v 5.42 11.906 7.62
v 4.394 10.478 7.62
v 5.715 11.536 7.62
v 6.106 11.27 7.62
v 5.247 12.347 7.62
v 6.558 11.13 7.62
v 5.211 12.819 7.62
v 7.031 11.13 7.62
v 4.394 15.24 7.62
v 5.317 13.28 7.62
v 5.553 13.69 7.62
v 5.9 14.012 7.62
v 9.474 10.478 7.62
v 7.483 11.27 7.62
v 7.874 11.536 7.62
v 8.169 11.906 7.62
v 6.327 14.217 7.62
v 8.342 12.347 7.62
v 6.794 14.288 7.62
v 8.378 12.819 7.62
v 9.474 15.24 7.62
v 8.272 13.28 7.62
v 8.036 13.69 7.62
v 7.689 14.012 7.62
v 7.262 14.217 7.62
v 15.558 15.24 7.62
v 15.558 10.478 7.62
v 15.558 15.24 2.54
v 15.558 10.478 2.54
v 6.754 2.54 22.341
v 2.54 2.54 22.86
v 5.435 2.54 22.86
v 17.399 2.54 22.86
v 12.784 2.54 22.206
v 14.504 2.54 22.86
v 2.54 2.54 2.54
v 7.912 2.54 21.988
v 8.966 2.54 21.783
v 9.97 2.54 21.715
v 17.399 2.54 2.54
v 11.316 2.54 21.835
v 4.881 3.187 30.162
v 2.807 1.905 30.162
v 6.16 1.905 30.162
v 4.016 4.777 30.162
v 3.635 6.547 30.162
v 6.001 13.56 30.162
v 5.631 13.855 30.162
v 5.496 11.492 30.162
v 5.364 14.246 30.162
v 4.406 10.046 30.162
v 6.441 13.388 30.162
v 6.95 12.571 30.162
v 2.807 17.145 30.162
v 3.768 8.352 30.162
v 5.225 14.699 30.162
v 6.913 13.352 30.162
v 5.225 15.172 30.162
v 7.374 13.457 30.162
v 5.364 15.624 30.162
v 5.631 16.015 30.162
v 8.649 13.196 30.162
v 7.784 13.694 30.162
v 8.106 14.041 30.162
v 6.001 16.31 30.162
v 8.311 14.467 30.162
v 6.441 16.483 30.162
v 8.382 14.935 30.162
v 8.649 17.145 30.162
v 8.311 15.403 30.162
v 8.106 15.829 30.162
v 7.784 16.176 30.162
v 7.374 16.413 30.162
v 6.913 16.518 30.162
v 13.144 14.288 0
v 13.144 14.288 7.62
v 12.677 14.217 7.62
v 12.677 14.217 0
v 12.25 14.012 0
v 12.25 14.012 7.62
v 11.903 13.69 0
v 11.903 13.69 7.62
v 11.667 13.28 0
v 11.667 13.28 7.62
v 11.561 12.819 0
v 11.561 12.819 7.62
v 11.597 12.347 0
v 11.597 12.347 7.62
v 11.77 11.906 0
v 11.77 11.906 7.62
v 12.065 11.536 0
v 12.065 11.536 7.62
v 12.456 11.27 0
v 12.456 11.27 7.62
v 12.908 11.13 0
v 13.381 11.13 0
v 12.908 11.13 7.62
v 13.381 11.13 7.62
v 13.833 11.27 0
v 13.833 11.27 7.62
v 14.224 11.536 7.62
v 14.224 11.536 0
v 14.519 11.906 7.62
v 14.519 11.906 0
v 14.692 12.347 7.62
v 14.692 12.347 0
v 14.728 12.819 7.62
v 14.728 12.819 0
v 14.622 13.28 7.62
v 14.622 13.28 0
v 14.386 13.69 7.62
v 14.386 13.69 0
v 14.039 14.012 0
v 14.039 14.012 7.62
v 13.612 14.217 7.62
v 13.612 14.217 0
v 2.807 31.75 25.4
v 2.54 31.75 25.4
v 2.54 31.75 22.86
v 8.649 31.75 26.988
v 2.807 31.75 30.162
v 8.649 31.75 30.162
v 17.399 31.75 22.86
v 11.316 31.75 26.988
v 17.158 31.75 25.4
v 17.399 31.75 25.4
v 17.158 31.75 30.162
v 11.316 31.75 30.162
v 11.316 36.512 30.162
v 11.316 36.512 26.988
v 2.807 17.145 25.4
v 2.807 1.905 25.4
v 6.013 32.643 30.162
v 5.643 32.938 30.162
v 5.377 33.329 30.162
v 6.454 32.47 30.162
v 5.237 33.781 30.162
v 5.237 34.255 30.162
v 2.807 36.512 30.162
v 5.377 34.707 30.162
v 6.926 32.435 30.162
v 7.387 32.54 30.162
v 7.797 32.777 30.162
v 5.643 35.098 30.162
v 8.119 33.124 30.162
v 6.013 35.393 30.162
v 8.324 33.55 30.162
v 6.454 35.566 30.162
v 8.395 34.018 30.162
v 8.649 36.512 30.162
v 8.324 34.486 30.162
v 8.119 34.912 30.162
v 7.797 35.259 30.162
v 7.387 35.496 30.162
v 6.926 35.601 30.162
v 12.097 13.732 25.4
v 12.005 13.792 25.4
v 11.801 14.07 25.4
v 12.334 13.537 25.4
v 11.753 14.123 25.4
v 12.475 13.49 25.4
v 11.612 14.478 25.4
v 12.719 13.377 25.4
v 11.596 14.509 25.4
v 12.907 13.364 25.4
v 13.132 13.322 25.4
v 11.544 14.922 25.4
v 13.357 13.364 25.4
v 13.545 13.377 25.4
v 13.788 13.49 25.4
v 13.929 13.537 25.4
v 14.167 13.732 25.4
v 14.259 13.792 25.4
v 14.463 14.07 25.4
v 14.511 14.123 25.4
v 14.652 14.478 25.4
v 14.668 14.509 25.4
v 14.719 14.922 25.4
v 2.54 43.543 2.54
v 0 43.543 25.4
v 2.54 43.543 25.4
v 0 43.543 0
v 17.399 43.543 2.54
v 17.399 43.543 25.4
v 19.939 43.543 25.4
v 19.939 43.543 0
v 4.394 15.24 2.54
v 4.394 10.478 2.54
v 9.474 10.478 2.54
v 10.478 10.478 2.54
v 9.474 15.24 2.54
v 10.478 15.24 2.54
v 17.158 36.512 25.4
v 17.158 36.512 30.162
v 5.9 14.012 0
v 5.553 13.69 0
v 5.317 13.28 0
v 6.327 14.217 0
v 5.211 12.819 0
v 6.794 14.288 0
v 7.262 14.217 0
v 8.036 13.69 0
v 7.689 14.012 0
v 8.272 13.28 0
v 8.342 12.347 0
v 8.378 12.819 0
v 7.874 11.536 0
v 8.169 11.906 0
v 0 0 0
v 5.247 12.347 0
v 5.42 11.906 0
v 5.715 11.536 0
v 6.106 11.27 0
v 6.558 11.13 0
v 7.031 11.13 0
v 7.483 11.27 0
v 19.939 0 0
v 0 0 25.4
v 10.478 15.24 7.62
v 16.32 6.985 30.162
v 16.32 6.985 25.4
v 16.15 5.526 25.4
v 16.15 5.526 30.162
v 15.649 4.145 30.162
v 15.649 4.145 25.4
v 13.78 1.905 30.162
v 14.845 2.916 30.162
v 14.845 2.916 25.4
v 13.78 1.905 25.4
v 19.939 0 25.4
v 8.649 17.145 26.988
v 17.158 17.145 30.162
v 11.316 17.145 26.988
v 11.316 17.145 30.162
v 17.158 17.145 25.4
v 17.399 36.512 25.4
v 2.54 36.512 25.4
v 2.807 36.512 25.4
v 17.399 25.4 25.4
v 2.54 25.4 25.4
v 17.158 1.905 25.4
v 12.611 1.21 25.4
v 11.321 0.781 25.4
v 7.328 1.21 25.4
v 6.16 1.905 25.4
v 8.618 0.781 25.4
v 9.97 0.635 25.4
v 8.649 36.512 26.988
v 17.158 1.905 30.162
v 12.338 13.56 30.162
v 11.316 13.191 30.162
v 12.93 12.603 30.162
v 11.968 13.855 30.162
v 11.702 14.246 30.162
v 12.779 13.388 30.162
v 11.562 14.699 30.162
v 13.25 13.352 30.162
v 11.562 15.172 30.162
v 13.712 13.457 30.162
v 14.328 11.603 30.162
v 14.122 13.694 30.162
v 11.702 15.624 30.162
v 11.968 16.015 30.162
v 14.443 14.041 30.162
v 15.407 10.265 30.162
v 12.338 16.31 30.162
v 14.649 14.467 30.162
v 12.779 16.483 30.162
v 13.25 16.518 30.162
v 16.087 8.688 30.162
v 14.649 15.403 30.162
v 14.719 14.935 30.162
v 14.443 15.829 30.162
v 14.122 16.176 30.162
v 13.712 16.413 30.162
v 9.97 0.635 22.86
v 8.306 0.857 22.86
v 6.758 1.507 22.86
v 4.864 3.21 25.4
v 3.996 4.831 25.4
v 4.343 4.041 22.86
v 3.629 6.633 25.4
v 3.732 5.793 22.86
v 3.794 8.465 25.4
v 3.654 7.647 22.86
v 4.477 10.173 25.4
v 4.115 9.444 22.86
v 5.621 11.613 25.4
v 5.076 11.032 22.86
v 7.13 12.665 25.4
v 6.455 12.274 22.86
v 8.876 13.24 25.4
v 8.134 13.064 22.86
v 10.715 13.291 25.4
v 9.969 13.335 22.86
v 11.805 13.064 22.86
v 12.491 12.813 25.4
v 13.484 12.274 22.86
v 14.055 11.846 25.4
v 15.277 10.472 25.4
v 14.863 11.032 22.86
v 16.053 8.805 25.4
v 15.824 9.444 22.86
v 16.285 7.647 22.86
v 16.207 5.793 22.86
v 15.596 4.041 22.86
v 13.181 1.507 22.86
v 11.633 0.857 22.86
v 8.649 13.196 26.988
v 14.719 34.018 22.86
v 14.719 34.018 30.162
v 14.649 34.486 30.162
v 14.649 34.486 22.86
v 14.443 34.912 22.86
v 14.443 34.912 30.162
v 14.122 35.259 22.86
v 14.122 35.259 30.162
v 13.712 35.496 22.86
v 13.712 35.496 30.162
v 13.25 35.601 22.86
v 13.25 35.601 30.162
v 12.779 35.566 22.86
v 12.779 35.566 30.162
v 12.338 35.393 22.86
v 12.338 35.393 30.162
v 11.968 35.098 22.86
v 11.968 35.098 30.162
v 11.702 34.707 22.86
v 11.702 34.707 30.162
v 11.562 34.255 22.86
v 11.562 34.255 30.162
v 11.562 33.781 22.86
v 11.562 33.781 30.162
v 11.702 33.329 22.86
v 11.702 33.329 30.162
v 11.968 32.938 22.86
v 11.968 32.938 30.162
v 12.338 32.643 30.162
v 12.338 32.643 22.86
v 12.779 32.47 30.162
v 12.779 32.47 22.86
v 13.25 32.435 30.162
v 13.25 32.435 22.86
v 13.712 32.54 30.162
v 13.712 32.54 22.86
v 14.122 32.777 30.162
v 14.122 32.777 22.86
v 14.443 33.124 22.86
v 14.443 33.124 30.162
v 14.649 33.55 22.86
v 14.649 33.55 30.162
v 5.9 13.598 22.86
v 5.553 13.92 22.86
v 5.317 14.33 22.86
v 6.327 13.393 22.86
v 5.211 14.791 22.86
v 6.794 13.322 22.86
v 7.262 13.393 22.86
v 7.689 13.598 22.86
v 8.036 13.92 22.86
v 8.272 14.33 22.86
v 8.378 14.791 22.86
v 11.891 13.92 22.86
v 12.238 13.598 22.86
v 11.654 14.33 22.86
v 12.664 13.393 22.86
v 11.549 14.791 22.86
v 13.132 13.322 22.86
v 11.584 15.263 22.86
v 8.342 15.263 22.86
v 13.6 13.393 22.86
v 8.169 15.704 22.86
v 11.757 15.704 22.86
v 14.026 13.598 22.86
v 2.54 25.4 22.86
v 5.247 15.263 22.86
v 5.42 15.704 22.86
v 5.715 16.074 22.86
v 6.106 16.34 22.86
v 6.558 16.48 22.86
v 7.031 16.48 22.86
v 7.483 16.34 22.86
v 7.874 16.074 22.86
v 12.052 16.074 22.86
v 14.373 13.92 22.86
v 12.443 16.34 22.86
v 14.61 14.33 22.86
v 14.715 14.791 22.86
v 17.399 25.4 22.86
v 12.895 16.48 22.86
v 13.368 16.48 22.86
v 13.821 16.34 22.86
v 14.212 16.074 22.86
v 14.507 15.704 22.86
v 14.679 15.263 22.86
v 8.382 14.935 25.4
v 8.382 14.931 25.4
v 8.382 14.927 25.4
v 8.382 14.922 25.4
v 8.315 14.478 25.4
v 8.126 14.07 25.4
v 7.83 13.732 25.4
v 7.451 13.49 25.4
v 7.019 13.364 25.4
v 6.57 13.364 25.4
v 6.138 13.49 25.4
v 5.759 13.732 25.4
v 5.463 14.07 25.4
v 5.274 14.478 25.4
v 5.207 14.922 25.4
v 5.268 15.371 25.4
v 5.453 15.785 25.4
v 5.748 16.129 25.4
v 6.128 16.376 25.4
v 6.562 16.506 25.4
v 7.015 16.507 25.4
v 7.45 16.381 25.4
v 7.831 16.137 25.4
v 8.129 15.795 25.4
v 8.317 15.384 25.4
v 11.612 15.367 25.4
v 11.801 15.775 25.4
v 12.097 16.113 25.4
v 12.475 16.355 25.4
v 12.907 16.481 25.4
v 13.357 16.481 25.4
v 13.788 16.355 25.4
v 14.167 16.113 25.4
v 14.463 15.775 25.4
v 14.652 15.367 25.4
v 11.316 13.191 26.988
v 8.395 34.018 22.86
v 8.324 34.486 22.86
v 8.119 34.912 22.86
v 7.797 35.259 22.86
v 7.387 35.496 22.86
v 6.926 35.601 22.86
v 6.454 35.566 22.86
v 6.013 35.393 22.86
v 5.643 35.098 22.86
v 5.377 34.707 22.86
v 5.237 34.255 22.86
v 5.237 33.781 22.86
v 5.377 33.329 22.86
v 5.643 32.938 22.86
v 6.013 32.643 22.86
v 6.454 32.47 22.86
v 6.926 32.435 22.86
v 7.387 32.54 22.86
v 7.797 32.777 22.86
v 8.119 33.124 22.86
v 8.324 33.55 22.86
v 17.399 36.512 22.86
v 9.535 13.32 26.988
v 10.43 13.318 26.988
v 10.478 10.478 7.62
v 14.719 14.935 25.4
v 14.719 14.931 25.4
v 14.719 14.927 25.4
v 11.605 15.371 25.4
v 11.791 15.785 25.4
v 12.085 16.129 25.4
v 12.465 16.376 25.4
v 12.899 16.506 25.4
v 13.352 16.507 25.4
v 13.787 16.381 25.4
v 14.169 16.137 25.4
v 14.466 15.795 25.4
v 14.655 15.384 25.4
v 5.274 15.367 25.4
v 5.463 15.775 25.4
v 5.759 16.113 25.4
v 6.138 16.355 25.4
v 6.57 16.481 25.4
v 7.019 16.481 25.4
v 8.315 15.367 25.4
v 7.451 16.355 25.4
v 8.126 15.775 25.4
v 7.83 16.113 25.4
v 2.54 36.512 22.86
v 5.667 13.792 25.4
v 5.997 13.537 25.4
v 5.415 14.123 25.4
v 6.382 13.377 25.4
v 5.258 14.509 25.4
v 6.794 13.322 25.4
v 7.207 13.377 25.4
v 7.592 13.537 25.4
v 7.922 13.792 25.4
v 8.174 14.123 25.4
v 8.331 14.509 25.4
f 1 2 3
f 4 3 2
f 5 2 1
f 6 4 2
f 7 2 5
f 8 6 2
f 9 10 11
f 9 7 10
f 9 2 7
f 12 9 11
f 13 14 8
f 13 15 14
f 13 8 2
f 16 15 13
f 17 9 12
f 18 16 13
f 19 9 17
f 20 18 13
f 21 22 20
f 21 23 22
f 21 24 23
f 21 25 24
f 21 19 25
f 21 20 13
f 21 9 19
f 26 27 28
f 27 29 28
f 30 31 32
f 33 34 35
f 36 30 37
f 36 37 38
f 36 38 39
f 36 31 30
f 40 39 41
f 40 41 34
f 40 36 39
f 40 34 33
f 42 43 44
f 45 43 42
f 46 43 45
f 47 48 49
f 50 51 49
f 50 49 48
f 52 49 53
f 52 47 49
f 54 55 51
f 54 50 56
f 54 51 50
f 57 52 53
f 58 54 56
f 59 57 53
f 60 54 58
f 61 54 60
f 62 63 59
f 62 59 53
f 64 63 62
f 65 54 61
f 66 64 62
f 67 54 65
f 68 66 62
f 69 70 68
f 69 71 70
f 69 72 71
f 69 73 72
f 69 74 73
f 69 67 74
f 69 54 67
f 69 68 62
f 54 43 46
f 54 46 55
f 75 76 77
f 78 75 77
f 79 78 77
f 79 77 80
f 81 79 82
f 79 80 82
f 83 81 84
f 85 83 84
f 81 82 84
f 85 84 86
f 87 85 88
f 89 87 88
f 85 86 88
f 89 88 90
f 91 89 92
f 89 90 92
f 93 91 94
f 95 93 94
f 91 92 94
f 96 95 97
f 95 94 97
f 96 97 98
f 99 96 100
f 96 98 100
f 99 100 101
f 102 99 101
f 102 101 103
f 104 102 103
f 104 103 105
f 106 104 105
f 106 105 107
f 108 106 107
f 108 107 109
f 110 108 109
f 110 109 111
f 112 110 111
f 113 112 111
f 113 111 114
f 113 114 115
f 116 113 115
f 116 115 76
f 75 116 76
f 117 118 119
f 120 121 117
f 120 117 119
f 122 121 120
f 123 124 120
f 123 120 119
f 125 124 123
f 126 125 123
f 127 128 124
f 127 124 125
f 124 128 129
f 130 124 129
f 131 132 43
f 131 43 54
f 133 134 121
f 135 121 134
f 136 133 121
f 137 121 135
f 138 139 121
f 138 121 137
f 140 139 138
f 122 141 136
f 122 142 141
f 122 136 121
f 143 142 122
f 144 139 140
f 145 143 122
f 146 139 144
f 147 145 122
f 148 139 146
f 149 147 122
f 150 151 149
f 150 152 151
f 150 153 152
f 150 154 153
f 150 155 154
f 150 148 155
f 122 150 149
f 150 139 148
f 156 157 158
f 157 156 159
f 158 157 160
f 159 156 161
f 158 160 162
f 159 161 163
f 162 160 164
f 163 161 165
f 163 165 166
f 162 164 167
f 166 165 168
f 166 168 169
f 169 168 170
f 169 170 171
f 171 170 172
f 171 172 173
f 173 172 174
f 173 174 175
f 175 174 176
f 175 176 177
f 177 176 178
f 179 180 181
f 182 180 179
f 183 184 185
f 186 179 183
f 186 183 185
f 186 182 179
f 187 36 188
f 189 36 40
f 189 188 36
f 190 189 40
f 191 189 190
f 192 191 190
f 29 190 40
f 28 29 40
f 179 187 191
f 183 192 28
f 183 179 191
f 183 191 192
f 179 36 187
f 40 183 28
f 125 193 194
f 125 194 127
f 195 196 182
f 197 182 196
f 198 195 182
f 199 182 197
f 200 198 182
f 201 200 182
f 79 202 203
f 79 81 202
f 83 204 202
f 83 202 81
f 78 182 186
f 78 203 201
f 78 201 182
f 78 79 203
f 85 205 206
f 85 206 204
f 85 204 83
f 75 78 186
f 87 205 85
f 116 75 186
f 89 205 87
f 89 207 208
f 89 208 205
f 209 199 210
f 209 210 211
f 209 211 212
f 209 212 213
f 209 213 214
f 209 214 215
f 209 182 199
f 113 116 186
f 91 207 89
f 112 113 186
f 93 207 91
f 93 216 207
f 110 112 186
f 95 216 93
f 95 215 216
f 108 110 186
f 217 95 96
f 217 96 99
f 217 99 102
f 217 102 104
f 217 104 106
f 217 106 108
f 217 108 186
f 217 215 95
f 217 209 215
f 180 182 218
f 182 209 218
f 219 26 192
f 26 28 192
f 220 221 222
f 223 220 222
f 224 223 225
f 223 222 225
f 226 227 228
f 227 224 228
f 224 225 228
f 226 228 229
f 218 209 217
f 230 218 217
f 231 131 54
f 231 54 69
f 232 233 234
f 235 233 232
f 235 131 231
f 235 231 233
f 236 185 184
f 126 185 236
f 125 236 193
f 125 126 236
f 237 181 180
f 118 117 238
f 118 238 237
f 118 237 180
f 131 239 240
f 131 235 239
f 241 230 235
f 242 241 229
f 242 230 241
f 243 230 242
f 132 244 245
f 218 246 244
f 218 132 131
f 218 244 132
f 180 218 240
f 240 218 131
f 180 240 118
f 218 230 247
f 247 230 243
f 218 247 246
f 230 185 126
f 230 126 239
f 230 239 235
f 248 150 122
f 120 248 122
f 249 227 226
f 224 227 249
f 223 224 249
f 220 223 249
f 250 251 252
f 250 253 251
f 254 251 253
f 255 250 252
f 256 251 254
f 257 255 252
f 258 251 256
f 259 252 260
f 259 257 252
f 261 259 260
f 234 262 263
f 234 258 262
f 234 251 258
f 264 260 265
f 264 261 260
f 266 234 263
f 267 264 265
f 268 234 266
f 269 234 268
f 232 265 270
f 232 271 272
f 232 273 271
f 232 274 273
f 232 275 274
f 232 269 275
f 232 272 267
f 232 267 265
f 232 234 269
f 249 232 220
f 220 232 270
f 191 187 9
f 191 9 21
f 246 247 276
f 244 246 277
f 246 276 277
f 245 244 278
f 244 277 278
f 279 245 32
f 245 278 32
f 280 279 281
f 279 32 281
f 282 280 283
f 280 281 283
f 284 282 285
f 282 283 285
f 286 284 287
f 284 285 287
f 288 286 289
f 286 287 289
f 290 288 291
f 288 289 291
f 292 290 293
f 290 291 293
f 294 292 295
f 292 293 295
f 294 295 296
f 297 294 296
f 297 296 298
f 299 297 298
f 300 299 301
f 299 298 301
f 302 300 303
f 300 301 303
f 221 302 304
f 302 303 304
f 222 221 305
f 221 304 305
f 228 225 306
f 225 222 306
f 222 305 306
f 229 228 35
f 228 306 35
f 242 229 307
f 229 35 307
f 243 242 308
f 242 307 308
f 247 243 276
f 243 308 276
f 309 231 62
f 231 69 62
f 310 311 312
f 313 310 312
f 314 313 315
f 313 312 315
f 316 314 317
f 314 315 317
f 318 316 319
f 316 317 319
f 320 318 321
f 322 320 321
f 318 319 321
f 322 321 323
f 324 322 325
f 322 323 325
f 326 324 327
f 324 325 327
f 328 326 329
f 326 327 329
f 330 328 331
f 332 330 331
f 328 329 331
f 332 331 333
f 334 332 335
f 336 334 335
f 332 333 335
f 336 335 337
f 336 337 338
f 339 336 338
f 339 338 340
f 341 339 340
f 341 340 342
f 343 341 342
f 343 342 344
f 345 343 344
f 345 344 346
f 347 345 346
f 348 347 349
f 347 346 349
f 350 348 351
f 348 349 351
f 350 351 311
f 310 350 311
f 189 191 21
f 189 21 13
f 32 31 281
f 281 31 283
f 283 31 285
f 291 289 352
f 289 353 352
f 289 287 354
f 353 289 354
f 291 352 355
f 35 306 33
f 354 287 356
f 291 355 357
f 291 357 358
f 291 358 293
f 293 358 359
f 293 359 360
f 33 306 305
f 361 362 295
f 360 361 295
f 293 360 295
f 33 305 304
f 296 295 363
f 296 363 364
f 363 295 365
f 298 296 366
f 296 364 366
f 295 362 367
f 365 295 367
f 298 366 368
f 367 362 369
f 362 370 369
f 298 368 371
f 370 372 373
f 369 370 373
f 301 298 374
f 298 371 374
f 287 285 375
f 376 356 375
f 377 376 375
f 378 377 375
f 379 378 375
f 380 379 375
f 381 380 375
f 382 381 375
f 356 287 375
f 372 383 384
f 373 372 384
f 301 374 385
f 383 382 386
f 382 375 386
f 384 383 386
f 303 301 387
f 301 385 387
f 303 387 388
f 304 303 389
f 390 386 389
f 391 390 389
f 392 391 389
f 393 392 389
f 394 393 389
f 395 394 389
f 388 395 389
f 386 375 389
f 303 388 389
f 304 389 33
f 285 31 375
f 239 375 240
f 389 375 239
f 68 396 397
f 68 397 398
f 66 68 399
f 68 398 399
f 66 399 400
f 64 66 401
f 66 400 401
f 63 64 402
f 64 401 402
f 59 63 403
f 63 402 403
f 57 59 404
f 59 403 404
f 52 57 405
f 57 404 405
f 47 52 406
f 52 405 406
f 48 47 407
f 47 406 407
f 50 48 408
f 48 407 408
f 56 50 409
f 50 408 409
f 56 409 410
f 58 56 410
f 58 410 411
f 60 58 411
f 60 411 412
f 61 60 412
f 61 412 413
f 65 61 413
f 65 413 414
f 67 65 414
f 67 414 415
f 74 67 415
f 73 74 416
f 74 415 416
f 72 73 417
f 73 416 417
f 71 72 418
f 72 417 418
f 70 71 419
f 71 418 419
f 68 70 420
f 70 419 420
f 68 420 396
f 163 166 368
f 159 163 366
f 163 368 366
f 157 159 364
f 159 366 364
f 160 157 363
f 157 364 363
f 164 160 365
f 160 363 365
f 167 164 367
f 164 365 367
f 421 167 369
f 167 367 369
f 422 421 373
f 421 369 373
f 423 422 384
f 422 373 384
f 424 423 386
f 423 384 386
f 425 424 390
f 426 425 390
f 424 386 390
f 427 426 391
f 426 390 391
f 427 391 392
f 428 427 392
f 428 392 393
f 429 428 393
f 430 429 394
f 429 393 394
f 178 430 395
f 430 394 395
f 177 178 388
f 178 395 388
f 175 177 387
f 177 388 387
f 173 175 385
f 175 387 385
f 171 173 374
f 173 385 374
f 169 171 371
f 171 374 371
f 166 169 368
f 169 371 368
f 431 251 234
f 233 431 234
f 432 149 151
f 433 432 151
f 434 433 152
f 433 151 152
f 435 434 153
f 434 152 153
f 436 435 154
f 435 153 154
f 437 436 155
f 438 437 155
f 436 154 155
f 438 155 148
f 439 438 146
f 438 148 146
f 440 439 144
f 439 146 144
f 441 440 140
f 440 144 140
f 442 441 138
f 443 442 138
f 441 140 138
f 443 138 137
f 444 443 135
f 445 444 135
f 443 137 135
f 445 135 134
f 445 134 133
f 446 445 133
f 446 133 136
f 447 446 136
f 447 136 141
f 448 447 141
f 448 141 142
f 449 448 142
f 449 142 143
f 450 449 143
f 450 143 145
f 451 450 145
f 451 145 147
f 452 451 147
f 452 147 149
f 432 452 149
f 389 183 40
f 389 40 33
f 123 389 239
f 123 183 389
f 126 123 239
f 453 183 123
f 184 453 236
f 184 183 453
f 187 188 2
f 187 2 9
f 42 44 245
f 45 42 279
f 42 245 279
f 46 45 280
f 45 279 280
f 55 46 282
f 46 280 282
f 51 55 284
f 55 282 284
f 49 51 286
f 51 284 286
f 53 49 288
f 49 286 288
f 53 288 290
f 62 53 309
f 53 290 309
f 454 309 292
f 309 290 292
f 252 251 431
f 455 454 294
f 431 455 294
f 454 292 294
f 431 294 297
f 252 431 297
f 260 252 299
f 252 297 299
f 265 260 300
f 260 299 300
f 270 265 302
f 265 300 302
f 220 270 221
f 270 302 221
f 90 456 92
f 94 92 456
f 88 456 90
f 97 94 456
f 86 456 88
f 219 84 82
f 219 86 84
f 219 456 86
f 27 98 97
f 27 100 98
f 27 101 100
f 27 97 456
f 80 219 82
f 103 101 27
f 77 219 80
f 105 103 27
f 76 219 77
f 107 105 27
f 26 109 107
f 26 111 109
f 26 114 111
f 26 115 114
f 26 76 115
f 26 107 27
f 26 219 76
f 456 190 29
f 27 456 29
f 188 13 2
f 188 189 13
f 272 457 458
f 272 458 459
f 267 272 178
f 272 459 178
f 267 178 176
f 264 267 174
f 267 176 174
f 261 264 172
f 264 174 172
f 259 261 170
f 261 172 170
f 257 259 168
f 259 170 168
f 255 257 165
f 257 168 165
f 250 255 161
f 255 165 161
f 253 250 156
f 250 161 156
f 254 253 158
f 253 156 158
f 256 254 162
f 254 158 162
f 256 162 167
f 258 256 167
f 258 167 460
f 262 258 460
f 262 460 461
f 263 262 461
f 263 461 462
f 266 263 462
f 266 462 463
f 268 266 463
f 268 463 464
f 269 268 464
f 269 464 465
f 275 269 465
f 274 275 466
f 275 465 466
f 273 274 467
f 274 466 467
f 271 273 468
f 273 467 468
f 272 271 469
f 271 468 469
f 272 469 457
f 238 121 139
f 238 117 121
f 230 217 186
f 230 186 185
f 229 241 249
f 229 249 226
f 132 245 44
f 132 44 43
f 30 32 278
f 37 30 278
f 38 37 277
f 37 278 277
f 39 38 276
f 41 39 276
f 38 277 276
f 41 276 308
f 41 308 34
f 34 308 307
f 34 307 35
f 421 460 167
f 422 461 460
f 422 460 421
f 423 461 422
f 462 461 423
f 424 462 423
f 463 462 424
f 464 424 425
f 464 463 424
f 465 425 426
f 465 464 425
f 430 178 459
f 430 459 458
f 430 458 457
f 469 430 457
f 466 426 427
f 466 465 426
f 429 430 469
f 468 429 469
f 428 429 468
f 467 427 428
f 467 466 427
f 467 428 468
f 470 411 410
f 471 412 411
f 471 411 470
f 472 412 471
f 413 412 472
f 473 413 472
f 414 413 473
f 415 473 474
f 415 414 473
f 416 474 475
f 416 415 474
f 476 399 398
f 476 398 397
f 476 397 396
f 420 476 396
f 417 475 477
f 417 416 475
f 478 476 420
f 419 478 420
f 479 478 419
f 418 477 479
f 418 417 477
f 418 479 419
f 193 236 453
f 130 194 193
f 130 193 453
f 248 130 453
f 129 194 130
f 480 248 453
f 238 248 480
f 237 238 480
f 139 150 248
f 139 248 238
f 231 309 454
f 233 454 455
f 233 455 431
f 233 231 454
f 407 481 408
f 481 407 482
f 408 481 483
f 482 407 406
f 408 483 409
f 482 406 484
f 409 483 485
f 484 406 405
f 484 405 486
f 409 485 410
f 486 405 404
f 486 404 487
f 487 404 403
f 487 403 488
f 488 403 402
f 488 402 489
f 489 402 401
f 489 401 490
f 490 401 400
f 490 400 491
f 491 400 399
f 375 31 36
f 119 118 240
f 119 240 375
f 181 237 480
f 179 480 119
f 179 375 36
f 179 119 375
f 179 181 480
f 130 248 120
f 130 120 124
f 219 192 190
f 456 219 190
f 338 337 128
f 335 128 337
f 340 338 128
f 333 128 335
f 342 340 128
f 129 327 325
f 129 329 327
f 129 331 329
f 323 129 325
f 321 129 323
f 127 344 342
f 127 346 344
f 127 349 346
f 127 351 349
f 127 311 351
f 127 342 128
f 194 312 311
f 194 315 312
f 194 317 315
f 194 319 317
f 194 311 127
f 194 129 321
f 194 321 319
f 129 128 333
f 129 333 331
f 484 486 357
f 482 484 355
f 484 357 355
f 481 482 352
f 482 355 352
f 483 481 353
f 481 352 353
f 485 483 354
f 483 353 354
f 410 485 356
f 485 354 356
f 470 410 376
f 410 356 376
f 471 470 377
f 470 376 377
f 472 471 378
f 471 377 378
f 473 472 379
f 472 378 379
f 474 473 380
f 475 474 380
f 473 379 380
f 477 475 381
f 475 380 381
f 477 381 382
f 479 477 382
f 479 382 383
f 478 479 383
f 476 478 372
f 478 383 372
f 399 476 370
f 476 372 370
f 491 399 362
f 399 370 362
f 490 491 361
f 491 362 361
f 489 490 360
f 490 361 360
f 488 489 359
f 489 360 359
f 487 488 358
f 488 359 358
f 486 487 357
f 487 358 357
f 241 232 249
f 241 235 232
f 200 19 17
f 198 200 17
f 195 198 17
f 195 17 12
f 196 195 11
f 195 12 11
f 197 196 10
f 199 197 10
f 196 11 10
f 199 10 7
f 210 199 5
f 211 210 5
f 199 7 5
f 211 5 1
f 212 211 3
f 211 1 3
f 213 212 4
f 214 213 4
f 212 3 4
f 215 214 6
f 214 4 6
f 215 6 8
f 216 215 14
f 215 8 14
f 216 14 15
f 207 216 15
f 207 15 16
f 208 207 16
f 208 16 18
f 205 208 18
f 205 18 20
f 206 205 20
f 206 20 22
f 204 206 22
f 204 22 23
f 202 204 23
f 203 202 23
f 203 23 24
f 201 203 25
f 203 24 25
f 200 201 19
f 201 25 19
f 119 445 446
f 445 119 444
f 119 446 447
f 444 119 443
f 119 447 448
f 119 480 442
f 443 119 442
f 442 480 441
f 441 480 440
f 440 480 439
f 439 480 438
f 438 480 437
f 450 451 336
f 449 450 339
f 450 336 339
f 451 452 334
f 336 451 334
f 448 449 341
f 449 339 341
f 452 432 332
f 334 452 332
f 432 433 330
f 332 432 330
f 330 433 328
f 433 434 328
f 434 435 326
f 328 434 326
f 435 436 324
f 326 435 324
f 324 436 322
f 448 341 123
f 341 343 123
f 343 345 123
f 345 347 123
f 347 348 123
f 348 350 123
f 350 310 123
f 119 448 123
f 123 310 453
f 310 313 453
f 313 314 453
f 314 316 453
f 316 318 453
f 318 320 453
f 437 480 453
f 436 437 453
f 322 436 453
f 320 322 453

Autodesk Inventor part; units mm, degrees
ref_plane "YZ Plane" through (0, 0, 0) normal (1, 0, 0) x (0, 1, 0)
ref_plane "XZ Plane" through (0, 0, 0) normal (0, 1, 0) x (-1, 0, 0)
ref_plane "XY Plane" through (0, 0, 0) normal (0, 0, 1) x (1, 0, 0)
sketch "Sketch1" plane through (0, 0, 0) normal (0, 0, 1) x (1, 0, 0)
  line L0 (0, 0) -> (19.939, 0)
  line L1 (19.939, 0) -> (19.939, 25.4)
  line L2 (19.939, 25.4) -> (0, 25.4)
  line L3 (0, 25.4) -> (0, 0)
  dimension "d0" = 19.939
  dimension "d1" = 25.4
extrude "Extrusion1" add sketch "Sketch1" along normal blind 25.4
shell "Shell1" thickness 2.54 removed faces 1 at (13.2927, 25.4, 8.4667)
sketch "Sketch2" plane through (0, 0, 25.4) normal (0, 0, 1) x (1, 0, 0)
  line L0 (15.367, 1.905) -> (4.572, 1.905)
  line L1 (4.572, 1.905) -> (4.572, 17.145)
  line L2 (4.572, 17.145) -> (15.367, 17.145)
  line L3 (15.367, 17.145) -> (15.367, 1.905)
  line L4 (15.367, 1.905) -> (4.572, 17.145) construction
  line L5 (4.572, 1.905) -> (15.367, 17.145) construction
  line L6 (0, 25.4) -> (0, 0) projected
  line L7 (0, 0) -> (19.939, 0) projected
  circle A0 centre (9.9695, 6.985) radius 3.175
  circle A1 centre (6.7945, 14.9098) radius 1.5875
  circle A2 centre (13.1318, 14.9098) radius 1.5875
  line L8 (19.939, 0) -> (19.939, 25.4) projected
  point P0 (9.9695, 9.525)
  dimension "d5" = 9.9695
  dimension "d6" = 9.525
  dimension "d7" = 15.24
  dimension "d8" = 10.795
  dimension "d9" = 6.35
  dimension "d10" = 5.08
  dimension "d11" = 3.175
  dimension "d12" = 7.9248
  dimension "d13" = 3.175
  dimension "d15" = 6.7945
  dimension "d16" = 6.8072
  dimension "d24" = 6.985
hole "Hole1" at (13.1318, 14.9098, 25.4) at (6.7945, 14.9098, 25.4) direction (0, 0, -1) diameter 3.175 depth 7.62 tip angle 118
sketch "Sketch3" plane through (0, 0, 25.4) normal (0, 0, 1) x (1, 0, 0)
  circle A0 centre (9.9695, 6.985) radius 6.35
  line L0 (0, 0) -> (19.939, 0) projected
  line L1 (19.939, 0) -> (19.939, 25.4) projected
  dimension "d25" = 12.7
  dimension "d26" = 6.985
  dimension "d27" = 9.9695
hole "Hole2" at (9.9695, 6.985, 25.4) direction (0, 0, -1) diameter 12.7 depth 2.54 tip angle 118
sketch "Sketch4" plane through (0, 0, 25.4) normal (0, 0, 1) x (1, 0, 0)
  line L0 (17.1577, 1.905) -> (2.8067, 1.905)
  line L1 (2.8067, 1.905) -> (2.8067, 17.145)
  line L2 (2.8067, 17.145) -> (17.1577, 17.145)
  line L3 (17.1577, 17.145) -> (17.1577, 1.905)
  line L4 (17.1577, 1.905) -> (2.8067, 17.145) construction
  line L5 (2.8067, 1.905) -> (17.1577, 17.145) construction
  line L6 (0, 0) -> (19.939, 0) projected
  line L7 (0, 25.4) -> (0, 0) projected
  circle A0 centre (13.1318, 14.9352) radius 1.5875
  circle A1 centre (6.7945, 14.9352) radius 1.5875
  line L8 (19.939, 0) -> (19.939, 25.4) projected
  circle A2 centre (9.9695, 6.985) radius 6.35
  point P0 (9.9822, 9.525)
  dimension "d35" = 9.525
  dimension "d36" = 14.351
  dimension "d38" = 9.9822
  dimension "d39" = 6.8072
  dimension "d40" = 6.7945
  dimension "d41" = 12.7
  dimension "d42" = 9.9695
  dimension "d43" = 5.08
  dimension "d44" = 7.9502
  dimension "d45" = 7.9502
  dimension "d56" = 6.3373
  dimension "d66" = 1.905
  dimension "d75" = 2.8067
  dimension "d76" = 2.7813
sketch "Sketch5" plane through (0, 0, 25.4) normal (0, 0, 1) x (1, 0, 0)
  point P0 (0, 0)
extrude "Extrusion2" add sketch "Sketch4" along normal blind 4.7625 contours L0 A2 L1 L2 L3
sketch "Sketch6" plane through (0, 0, 30.1625) normal (0, 0, 1) x (1, 0, 0)
  line L0 (17.1577, 1.905) -> (2.8067, 1.905) projected
  line L1 (8.6487, 1.905) -> (11.3157, 1.905)
  line L2 (11.3157, 1.905) -> (11.3157, 40.005)
  line L3 (11.3157, 40.005) -> (8.6487, 40.005)
  line L4 (8.6487, 40.005) -> (8.6487, 1.905)
  line L5 (17.1577, 1.905) -> (17.1577, 17.145) projected
  point P0 (0, 0)
  dimension "d48" = 2.667
  dimension "d49" = 5.842
  dimension "d71" = 38.1
extrude "Extrusion3" cut sketch "Sketch6" against normal blind 3.175
sketch "Sketch9" plane through (2.54, 2.54, 2.54) normal (0, 0, 1) x (1, 0, 0)
  line L0 (1.8542, 12.7) -> (6.9342, 12.7)
  line L1 (6.9342, 12.7) -> (6.9342, 7.9375)
  line L2 (6.9342, 7.9375) -> (1.8542, 7.9375)
  line L3 (1.8542, 7.9375) -> (1.8542, 12.7)
  line L4 (7.9375, 12.7) -> (14.2875, 12.7)
  line L5 (14.2875, 12.7) -> (14.2875, 7.9375)
  line L6 (14.2875, 7.9375) -> (7.9375, 7.9375)
  line L7 (7.9375, 7.9375) -> (7.9375, 12.7)
  line L8 (0, 22.86) -> (14.859, 22.86) projected
  line L9 (0, 22.86) -> (0, 0) projected
  point P0 (-2.54, -2.54)
  dimension "d97" = 10.16
  dimension "d98" = 5.08
  dimension "d100" = 1.8542
  dimension "d101" = 4.7625
extrude "Extrusion5" add sketch "Sketch9" along normal blind 5.08 contours L0 L1 L2 L3
sketch "Sketch10" plane through (2.54, 2.54, 2.54) normal (0, 0, 1) x (1, 0, 0)
  line L0 (7.9375, 7.9375) -> (13.0175, 7.9375)
  line L1 (13.0175, 7.9375) -> (13.0175, 12.7)
  line L2 (13.0175, 12.7) -> (7.9375, 12.7)
  line L3 (7.9375, 12.7) -> (7.9375, 7.9375)
  line L4 (0, 22.86) -> (14.859, 22.86) projected
  line L5 (1.8542, 12.7) -> (6.9342, 12.7) projected
  point P0 (-2.54, -2.54)
  dimension "d94" = 5.08
  dimension "d95" = 10.16
  dimension "d96" = 10.16
  dimension "d99" = 1.8415
  dimension "d102" = 4.7625
extrude "Extrusion6" add sketch "Sketch10" along normal blind 5.08
sketch "Sketch11" plane through (0, 0, 0) normal (0, 0, -1) x (-1, 0, 0)
  circle A0 centre (-13.1445, 12.7) radius 1.5875
  circle A1 centre (-6.7945, 12.7) radius 1.5875
  line L0 (0, 25.4) -> (0, 0) projected
  line L1 (-19.939, 0) -> (-19.939, 25.4) projected
  line L2 (0, 0) -> (-19.939, 0) projected
  dimension "d81" = 6.7945
  dimension "d91" = 12.7
  dimension "d92" = 12.7
  dimension "d93" = 6.35
hole "Hole4" at (13.1445, 12.7, 0) at (6.7945, 12.7, 0) direction (0, 0, 1) diameter 3.175 depth 15.24 tip angle 118
sketch "Sketch12" plane through (0, 25.4, 0) normal (0, 1, 0) x (1, 0, 0)
  line L0 (0, 0) -> (0, -25.4) projected
  line L1 (19.939, 0) -> (19.939, -25.4) projected
  line L2 (0, 0) -> (19.939, 0)
  line L3 (19.939, 0) -> (19.939, -25.4)
  line L4 (19.939, -25.4) -> (0, -25.4)
  line L5 (0, -25.4) -> (0, 0)
extrude "Extrusion7" add sketch "Sketch12" along normal blind 18.1429
sketch "Sketch13" plane through (0, 43.5429, 0) normal (0, 1, 0) x (1, 0, 0)
  line L0 (2.54, -2.54) -> (17.399, -2.54)
  line L1 (17.399, -2.54) -> (17.399, -25.4)
  line L2 (17.399, -25.4) -> (2.54, -25.4)
  line L3 (2.54, -25.4) -> (2.54, -2.54)
  line L4 (19.939, 0) -> (0, 0) projected
  line L5 (0, 0) -> (0, -25.4) projected
  line L6 (19.939, -25.4) -> (19.939, 0) projected
  dimension "d105" = 2.54
  dimension "d106" = 2.54
  dimension "d107" = 25.4
  dimension "d110" = 2.54
extrude "Extrusion8" cut sketch "Sketch13" against normal blind 18.1429
sketch "Sketch14" plane through (0, 0, 25.4) normal (0, 0, 1) x (1, 0, 0)
  line L0 (2.8067, 36.5125) -> (17.1577, 36.5125)
  line L1 (17.1577, 36.5125) -> (17.1577, 31.75)
  line L2 (17.1577, 31.75) -> (2.8067, 31.75)
  line L3 (2.8067, 31.75) -> (2.8067, 36.5125)
  line L4 (0, 0) -> (0, 43.5429) projected
  line L5 (19.939, 0) -> (19.939, 43.5429) projected
  line L6 (2.8067, 17.145) -> (2.8067, 1.905) projected
  line L7 (17.1577, 1.905) -> (17.1577, 17.145) projected
  dimension "d134" = 0
  dimension "d135" = 0
extrude "Extrusion9" add sketch "Sketch14" along normal blind 4.7625 and the other way blind 2.54
sketch "Sketch15" plane through (0, 0, 30.1625) normal (0, 0, 1) x (1, 0, 0)
  line L0 (2.8067, 31.75) -> (17.1577, 31.75) projected
  line L1 (8.6487, 31.75) -> (11.3157, 31.75)
  line L2 (11.3157, 31.75) -> (11.3157, 36.5125)
  line L3 (11.3157, 36.5125) -> (8.6487, 36.5125)
  line L4 (8.6487, 36.5125) -> (8.6487, 31.75)
  line L5 (2.8067, 36.5125) -> (2.8067, 31.75) projected
  line L6 (17.1577, 31.75) -> (17.1577, 36.5125) projected
  line L7 (17.1577, 36.5125) -> (2.8067, 36.5125) projected
  line L8 (19.939, 0) -> (19.939, 43.5429) projected
  line L9 (17.399, 43.5429) -> (17.399, 25.4) projected
  line L10 (17.1577, 1.905) -> (17.1577, 17.145) projected
  point P0 (0, 0)
  point P1 (17.399, 31.75)
  dimension "d119" = 0
  dimension "d130" = 2.667
  dimension "d133" = 5.842
extrude "Extrusion10" cut sketch "Sketch15" against normal blind 3.175 contours L4 L3 L2 L0
sketch "Sketch16" plane through (0, 0, 30.1625) normal (0, 0, 1) x (1, 0, 0)
  circle A0 centre (6.8072, 34.0179) radius 1.5875
  circle A1 centre (13.1318, 34.0179) radius 1.5875
  line L0 (0, 0) -> (0, 43.5429) projected
  line L1 (19.939, 0) -> (19.939, 43.5429) projected
  line L2 (2.54, 43.5429) -> (17.399, 43.5429) projected
  dimension "d122" = 3.175
  dimension "d123" = 3.175
  dimension "d124" = 6.8072
  dimension "d125" = 6.8072
  dimension "d126" = 9.525
  dimension "d127" = 9.525
extrude "Extrusion11" cut sketch "Sketch16" against normal blind 12.7
sketch "Sketch17" plane through (0, 0, 25.4) normal (0, 0, 1) x (1, 0, 0)
  line L0 (17.1577, 36.5125) -> (17.1577, 31.75) projected
  line L1 (19.939, 0) -> (19.939, 43.5429) projected
  line L2 (17.1577, 31.75) -> (19.939, 31.75)
  line L3 (19.939, 31.75) -> (19.939, 36.5125)
  line L4 (19.939, 36.5125) -> (17.1577, 36.5125)
  line L5 (17.1577, 36.5125) -> (17.1577, 31.75)
  line L6 (2.8067, 31.75) -> (2.8067, 36.5125) projected
  line L7 (0, 0) -> (0, 43.5429) projected
  line L8 (2.8067, 31.75) -> (0, 31.75)
  line L9 (0, 31.75) -> (0, 36.5125)
  line L10 (0, 36.5125) -> (2.8067, 36.5125)
  line L11 (2.8067, 36.5125) -> (2.8067, 31.75)
extrude "Extrusion12" add sketch "Sketch17" against normal blind 2.54
equation "\"d125\" = d124"
equation "\"d127\" = d126"
properties part number "BasePlateBottom"
